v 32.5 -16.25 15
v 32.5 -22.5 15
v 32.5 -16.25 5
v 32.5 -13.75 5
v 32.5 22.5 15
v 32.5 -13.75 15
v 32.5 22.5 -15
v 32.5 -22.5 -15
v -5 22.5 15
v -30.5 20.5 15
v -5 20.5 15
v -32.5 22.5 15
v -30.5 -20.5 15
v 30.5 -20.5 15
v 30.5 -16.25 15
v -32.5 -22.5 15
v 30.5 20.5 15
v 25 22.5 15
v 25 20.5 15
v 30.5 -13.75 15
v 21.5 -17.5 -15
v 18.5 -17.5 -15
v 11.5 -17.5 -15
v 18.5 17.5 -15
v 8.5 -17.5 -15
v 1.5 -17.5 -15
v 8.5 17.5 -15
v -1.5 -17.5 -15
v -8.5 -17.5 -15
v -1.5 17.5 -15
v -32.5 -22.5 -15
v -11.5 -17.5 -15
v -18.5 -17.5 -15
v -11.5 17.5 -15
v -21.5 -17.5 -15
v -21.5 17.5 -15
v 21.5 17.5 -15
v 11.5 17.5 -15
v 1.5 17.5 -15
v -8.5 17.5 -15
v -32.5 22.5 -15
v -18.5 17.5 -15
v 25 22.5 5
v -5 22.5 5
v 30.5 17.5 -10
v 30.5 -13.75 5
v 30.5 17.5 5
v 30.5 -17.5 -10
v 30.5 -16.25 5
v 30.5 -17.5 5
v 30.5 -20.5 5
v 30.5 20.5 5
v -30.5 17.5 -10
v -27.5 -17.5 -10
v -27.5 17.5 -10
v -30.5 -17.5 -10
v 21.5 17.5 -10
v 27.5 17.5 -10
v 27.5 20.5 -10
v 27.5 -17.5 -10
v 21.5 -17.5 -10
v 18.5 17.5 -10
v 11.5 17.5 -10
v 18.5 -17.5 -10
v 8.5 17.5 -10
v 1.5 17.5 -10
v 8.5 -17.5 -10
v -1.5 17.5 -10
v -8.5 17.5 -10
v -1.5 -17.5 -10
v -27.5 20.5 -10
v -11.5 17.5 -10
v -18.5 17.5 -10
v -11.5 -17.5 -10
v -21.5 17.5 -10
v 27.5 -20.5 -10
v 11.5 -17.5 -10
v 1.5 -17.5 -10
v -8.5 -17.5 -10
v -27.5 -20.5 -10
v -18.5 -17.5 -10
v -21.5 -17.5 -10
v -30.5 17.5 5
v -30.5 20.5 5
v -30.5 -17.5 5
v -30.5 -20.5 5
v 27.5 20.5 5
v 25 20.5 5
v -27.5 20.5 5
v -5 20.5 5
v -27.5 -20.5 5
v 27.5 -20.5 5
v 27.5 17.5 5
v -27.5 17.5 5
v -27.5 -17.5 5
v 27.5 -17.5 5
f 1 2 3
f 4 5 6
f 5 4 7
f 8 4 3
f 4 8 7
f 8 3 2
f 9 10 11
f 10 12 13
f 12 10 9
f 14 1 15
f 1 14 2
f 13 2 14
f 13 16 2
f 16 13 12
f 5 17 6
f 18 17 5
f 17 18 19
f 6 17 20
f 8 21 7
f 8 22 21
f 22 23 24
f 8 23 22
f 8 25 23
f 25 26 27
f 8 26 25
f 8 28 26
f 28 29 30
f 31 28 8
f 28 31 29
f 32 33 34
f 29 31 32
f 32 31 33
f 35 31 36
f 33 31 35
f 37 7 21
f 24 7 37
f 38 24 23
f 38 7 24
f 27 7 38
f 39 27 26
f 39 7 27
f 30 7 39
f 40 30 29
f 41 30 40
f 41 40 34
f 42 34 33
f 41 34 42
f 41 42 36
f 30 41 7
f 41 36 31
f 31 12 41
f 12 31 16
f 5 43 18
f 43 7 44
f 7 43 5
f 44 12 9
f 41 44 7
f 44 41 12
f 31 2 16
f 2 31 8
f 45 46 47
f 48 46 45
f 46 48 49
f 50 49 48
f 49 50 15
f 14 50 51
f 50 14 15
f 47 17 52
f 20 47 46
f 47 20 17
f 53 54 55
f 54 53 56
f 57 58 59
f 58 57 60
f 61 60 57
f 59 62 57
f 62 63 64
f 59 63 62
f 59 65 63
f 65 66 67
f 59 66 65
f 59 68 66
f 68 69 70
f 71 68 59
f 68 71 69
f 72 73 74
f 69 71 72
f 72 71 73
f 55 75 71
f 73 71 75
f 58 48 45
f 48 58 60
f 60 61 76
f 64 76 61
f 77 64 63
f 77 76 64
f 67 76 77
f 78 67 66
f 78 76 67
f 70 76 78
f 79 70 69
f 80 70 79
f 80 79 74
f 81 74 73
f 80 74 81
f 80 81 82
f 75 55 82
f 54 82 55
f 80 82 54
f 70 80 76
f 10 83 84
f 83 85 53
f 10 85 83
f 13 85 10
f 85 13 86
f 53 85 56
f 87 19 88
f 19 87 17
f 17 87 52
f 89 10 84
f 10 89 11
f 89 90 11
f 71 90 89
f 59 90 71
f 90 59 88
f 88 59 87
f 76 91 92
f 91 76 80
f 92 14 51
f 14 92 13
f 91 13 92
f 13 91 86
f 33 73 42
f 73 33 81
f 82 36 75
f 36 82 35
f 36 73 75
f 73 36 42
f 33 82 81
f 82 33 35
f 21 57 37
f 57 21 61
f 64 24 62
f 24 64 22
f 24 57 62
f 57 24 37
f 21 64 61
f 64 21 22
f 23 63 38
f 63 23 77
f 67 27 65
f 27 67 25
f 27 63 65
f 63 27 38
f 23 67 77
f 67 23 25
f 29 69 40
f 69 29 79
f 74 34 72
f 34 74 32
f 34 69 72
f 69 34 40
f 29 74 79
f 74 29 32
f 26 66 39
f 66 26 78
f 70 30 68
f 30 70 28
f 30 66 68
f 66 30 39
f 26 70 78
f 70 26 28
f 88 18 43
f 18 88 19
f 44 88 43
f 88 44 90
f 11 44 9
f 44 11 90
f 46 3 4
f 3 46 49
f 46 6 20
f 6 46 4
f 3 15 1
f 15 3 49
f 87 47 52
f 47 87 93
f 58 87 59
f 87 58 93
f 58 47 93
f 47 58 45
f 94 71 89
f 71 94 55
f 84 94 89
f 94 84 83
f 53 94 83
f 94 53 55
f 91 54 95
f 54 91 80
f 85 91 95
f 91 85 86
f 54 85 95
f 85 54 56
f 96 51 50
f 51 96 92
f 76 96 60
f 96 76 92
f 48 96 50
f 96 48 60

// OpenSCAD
base();
%top();


module base(){

difference() {
cube([65,45,30], center = true);
translate([0, 0, 5]) cube([61,41,30], center = true);

translate([0, 0, 5]) cube([5,20,30], center = true);
 
translate([-20, 0, -14]) cube([3,35,10], center = true);   
translate([20, 0, -14]) cube([3,35,10], center = true);
translate([10, 0, -14]) cube([3,35,10], center = true);
translate([-10, 0, -14]) cube([3,35,10], center = true);
translate([0, 0, -14]) cube([3,35,10], center = true);
  
translate([10, 22,20]) cube([30,5,30], center = true); 
 translate([31.5, -15,20]) cube([2.5,2.5,30], center = true);  
  

}

translate([29, 19, -2.5]) cube([3,3,15], center = true);
translate([-29, 19, -2.5]) cube([3,3,15], center = true);
translate([-29, -19, -2.5]) cube([3,3,15], center = true);
translate([29, -19, -2.5]) cube([3,3,15], center = true); 
}







module top(){
difference(){
translate([0, 0, 5]) cube([61,41,5], center = true);
translate([45-25, -4, 5]) cube([21,33,6], center = true);
   
}

translate([28, 18, 1.4]) cube([5,5,3], center = true);
translate([-28, 18, 1.4]) cube([5,5,3], center = true);
translate([-28, -18, 1.4]) cube([5,5,3], center = true);
translate([7, -18, 1.4]) cube([5,5,3], center = true);
}
